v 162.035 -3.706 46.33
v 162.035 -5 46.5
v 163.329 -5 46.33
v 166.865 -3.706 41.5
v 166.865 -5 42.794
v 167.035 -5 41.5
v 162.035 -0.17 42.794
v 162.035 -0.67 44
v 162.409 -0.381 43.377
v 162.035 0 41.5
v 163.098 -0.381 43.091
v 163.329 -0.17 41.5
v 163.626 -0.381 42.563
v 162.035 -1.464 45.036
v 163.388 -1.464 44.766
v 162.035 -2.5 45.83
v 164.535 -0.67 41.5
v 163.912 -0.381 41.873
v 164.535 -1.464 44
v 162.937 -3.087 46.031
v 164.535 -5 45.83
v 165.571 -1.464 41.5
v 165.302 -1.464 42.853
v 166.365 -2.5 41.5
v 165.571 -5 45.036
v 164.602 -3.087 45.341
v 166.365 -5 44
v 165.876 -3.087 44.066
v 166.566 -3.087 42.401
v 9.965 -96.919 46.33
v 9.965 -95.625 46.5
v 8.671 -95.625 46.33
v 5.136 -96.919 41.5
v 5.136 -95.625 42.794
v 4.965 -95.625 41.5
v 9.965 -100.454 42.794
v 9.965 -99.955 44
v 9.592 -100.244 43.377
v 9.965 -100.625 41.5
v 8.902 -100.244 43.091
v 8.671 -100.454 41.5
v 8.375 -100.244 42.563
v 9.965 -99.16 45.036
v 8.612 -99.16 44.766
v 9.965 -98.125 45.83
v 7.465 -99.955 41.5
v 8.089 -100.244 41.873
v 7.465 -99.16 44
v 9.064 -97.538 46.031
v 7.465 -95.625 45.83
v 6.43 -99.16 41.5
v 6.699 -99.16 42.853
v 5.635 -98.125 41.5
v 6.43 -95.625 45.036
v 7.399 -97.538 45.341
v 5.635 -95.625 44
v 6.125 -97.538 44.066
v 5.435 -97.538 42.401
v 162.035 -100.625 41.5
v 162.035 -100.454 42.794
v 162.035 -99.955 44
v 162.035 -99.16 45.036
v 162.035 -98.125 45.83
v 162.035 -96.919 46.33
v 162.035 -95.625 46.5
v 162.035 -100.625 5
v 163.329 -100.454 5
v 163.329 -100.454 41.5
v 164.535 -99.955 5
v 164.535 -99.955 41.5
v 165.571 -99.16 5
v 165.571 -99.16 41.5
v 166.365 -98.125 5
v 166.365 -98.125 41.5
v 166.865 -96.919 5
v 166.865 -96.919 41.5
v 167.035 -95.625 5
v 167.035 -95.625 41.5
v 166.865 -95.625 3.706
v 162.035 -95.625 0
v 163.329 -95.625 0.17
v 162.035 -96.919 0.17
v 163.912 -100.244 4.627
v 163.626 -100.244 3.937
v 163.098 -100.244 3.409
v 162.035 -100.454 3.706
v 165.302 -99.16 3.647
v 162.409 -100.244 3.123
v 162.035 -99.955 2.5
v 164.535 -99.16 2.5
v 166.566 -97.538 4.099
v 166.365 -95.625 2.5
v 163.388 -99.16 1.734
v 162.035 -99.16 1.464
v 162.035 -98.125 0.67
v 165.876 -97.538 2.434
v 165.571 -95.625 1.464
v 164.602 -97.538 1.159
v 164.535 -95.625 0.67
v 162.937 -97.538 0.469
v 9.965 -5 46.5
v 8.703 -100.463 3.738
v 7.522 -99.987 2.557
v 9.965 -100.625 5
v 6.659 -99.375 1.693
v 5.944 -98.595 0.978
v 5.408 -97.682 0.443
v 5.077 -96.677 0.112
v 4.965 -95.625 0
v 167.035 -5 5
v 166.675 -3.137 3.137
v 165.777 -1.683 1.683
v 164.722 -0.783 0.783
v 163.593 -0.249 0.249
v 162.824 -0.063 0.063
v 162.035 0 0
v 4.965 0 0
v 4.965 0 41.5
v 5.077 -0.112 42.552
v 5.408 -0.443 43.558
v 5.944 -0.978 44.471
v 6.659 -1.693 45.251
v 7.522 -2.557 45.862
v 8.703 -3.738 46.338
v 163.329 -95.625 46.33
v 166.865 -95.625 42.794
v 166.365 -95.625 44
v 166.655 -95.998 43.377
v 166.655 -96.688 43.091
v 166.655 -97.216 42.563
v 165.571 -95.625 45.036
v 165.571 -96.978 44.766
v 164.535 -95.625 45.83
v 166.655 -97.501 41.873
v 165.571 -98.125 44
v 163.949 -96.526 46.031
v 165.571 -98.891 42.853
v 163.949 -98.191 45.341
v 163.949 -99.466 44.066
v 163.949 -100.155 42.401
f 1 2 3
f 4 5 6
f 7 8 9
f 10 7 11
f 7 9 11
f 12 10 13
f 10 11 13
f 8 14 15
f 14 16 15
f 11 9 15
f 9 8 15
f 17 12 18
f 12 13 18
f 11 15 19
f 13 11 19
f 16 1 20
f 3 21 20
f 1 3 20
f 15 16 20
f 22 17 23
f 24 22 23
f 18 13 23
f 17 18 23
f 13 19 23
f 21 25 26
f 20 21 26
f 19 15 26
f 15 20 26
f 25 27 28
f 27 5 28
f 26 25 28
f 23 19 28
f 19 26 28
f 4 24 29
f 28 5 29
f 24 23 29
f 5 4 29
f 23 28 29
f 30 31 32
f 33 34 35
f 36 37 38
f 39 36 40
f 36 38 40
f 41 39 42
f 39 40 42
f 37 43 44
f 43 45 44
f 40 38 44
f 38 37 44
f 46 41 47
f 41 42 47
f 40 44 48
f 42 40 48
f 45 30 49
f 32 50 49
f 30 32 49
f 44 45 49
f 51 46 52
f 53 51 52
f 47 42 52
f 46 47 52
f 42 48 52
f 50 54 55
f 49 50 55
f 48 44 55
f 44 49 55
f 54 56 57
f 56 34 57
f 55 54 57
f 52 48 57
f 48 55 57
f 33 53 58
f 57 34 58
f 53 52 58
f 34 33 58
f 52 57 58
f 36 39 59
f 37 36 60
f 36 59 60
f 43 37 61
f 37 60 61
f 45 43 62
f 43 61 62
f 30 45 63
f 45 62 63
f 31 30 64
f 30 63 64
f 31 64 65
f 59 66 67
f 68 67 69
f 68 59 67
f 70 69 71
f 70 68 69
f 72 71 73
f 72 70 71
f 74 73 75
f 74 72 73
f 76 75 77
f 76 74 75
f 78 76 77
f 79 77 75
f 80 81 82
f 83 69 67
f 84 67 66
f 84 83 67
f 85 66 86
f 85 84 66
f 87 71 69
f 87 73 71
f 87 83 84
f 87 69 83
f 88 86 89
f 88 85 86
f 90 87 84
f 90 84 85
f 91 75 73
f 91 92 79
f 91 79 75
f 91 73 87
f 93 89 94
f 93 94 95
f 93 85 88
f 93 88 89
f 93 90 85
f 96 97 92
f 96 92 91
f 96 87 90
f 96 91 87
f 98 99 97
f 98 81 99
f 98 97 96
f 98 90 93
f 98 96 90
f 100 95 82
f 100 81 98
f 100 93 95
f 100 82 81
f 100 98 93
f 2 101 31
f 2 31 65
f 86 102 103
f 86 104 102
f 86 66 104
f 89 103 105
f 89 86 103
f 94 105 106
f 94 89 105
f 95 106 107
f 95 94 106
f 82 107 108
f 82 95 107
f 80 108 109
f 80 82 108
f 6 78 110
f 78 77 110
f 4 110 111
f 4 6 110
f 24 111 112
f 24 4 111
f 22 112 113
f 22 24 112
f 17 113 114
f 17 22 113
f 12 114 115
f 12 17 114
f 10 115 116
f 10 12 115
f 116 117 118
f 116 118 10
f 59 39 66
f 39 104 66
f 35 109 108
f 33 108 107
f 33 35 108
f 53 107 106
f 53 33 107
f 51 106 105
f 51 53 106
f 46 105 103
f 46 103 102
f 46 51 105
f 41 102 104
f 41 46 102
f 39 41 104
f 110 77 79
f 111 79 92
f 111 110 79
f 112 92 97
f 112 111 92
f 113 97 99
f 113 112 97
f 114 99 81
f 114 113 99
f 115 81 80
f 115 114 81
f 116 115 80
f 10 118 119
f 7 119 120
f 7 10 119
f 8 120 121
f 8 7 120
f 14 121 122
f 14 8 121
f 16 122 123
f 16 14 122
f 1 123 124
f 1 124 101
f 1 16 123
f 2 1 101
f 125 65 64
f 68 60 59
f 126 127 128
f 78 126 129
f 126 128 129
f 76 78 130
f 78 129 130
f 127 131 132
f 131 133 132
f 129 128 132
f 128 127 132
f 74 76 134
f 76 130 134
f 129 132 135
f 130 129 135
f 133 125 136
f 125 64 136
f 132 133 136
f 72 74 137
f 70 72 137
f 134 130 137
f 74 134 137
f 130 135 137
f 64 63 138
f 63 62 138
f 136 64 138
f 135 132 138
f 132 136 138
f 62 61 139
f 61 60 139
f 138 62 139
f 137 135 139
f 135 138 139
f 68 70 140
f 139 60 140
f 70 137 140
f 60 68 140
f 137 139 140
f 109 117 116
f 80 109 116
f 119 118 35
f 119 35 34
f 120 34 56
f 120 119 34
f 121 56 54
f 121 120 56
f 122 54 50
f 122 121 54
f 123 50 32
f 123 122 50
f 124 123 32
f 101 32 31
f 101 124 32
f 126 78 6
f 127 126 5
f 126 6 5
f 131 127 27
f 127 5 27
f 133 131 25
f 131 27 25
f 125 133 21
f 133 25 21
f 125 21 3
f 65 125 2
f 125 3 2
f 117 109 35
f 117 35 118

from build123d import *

# Parameters (mm, degrees)
F0_W     = 162.069825
F0_H     = 100.624777
F1_DEPTH = 46.5
F2_R     = 5
F3_W     = 55.878233
F3_H     = 11.453293
F4_DEPTH = 17.7


with BuildPart() as f1:
    # F0 (on Top) → F1 (new body)
    with BuildSketch(Plane.XY):
        with Locations((86.000398, -50.312388)):
            Rectangle(F0_W, F0_H)
    extrude(amount=F1_DEPTH)

    # F2
    f2_edges = [f1.edges().sort_by_distance(p)[0] for p in [
        (4.965486, -50.312389, 46.5),
        (86.000399, -100.624777, 46.5),
        (167.035311, -50.312389, 46.5),
        (86.000399, 0, 46.5),
        (167.035311, -50.312389, 0),
        (167.035311, -100.624777, 23.25),
        (167.035311, 0, 23.25),
        (4.965486, -100.624777, 23.25),
        (86.000399, -100.624777, 0),
    ]]
    fillet(f2_edges, radius=F2_R)

    # F3 (on face) → F4 (join)
    with BuildSketch(Plane.XY.offset(46.5)):
        with Locations((68.088533, -73.464717)):
            Rectangle(F3_W, F3_H)
    extrude(amount=-F4_DEPTH)


solid = f1.part
